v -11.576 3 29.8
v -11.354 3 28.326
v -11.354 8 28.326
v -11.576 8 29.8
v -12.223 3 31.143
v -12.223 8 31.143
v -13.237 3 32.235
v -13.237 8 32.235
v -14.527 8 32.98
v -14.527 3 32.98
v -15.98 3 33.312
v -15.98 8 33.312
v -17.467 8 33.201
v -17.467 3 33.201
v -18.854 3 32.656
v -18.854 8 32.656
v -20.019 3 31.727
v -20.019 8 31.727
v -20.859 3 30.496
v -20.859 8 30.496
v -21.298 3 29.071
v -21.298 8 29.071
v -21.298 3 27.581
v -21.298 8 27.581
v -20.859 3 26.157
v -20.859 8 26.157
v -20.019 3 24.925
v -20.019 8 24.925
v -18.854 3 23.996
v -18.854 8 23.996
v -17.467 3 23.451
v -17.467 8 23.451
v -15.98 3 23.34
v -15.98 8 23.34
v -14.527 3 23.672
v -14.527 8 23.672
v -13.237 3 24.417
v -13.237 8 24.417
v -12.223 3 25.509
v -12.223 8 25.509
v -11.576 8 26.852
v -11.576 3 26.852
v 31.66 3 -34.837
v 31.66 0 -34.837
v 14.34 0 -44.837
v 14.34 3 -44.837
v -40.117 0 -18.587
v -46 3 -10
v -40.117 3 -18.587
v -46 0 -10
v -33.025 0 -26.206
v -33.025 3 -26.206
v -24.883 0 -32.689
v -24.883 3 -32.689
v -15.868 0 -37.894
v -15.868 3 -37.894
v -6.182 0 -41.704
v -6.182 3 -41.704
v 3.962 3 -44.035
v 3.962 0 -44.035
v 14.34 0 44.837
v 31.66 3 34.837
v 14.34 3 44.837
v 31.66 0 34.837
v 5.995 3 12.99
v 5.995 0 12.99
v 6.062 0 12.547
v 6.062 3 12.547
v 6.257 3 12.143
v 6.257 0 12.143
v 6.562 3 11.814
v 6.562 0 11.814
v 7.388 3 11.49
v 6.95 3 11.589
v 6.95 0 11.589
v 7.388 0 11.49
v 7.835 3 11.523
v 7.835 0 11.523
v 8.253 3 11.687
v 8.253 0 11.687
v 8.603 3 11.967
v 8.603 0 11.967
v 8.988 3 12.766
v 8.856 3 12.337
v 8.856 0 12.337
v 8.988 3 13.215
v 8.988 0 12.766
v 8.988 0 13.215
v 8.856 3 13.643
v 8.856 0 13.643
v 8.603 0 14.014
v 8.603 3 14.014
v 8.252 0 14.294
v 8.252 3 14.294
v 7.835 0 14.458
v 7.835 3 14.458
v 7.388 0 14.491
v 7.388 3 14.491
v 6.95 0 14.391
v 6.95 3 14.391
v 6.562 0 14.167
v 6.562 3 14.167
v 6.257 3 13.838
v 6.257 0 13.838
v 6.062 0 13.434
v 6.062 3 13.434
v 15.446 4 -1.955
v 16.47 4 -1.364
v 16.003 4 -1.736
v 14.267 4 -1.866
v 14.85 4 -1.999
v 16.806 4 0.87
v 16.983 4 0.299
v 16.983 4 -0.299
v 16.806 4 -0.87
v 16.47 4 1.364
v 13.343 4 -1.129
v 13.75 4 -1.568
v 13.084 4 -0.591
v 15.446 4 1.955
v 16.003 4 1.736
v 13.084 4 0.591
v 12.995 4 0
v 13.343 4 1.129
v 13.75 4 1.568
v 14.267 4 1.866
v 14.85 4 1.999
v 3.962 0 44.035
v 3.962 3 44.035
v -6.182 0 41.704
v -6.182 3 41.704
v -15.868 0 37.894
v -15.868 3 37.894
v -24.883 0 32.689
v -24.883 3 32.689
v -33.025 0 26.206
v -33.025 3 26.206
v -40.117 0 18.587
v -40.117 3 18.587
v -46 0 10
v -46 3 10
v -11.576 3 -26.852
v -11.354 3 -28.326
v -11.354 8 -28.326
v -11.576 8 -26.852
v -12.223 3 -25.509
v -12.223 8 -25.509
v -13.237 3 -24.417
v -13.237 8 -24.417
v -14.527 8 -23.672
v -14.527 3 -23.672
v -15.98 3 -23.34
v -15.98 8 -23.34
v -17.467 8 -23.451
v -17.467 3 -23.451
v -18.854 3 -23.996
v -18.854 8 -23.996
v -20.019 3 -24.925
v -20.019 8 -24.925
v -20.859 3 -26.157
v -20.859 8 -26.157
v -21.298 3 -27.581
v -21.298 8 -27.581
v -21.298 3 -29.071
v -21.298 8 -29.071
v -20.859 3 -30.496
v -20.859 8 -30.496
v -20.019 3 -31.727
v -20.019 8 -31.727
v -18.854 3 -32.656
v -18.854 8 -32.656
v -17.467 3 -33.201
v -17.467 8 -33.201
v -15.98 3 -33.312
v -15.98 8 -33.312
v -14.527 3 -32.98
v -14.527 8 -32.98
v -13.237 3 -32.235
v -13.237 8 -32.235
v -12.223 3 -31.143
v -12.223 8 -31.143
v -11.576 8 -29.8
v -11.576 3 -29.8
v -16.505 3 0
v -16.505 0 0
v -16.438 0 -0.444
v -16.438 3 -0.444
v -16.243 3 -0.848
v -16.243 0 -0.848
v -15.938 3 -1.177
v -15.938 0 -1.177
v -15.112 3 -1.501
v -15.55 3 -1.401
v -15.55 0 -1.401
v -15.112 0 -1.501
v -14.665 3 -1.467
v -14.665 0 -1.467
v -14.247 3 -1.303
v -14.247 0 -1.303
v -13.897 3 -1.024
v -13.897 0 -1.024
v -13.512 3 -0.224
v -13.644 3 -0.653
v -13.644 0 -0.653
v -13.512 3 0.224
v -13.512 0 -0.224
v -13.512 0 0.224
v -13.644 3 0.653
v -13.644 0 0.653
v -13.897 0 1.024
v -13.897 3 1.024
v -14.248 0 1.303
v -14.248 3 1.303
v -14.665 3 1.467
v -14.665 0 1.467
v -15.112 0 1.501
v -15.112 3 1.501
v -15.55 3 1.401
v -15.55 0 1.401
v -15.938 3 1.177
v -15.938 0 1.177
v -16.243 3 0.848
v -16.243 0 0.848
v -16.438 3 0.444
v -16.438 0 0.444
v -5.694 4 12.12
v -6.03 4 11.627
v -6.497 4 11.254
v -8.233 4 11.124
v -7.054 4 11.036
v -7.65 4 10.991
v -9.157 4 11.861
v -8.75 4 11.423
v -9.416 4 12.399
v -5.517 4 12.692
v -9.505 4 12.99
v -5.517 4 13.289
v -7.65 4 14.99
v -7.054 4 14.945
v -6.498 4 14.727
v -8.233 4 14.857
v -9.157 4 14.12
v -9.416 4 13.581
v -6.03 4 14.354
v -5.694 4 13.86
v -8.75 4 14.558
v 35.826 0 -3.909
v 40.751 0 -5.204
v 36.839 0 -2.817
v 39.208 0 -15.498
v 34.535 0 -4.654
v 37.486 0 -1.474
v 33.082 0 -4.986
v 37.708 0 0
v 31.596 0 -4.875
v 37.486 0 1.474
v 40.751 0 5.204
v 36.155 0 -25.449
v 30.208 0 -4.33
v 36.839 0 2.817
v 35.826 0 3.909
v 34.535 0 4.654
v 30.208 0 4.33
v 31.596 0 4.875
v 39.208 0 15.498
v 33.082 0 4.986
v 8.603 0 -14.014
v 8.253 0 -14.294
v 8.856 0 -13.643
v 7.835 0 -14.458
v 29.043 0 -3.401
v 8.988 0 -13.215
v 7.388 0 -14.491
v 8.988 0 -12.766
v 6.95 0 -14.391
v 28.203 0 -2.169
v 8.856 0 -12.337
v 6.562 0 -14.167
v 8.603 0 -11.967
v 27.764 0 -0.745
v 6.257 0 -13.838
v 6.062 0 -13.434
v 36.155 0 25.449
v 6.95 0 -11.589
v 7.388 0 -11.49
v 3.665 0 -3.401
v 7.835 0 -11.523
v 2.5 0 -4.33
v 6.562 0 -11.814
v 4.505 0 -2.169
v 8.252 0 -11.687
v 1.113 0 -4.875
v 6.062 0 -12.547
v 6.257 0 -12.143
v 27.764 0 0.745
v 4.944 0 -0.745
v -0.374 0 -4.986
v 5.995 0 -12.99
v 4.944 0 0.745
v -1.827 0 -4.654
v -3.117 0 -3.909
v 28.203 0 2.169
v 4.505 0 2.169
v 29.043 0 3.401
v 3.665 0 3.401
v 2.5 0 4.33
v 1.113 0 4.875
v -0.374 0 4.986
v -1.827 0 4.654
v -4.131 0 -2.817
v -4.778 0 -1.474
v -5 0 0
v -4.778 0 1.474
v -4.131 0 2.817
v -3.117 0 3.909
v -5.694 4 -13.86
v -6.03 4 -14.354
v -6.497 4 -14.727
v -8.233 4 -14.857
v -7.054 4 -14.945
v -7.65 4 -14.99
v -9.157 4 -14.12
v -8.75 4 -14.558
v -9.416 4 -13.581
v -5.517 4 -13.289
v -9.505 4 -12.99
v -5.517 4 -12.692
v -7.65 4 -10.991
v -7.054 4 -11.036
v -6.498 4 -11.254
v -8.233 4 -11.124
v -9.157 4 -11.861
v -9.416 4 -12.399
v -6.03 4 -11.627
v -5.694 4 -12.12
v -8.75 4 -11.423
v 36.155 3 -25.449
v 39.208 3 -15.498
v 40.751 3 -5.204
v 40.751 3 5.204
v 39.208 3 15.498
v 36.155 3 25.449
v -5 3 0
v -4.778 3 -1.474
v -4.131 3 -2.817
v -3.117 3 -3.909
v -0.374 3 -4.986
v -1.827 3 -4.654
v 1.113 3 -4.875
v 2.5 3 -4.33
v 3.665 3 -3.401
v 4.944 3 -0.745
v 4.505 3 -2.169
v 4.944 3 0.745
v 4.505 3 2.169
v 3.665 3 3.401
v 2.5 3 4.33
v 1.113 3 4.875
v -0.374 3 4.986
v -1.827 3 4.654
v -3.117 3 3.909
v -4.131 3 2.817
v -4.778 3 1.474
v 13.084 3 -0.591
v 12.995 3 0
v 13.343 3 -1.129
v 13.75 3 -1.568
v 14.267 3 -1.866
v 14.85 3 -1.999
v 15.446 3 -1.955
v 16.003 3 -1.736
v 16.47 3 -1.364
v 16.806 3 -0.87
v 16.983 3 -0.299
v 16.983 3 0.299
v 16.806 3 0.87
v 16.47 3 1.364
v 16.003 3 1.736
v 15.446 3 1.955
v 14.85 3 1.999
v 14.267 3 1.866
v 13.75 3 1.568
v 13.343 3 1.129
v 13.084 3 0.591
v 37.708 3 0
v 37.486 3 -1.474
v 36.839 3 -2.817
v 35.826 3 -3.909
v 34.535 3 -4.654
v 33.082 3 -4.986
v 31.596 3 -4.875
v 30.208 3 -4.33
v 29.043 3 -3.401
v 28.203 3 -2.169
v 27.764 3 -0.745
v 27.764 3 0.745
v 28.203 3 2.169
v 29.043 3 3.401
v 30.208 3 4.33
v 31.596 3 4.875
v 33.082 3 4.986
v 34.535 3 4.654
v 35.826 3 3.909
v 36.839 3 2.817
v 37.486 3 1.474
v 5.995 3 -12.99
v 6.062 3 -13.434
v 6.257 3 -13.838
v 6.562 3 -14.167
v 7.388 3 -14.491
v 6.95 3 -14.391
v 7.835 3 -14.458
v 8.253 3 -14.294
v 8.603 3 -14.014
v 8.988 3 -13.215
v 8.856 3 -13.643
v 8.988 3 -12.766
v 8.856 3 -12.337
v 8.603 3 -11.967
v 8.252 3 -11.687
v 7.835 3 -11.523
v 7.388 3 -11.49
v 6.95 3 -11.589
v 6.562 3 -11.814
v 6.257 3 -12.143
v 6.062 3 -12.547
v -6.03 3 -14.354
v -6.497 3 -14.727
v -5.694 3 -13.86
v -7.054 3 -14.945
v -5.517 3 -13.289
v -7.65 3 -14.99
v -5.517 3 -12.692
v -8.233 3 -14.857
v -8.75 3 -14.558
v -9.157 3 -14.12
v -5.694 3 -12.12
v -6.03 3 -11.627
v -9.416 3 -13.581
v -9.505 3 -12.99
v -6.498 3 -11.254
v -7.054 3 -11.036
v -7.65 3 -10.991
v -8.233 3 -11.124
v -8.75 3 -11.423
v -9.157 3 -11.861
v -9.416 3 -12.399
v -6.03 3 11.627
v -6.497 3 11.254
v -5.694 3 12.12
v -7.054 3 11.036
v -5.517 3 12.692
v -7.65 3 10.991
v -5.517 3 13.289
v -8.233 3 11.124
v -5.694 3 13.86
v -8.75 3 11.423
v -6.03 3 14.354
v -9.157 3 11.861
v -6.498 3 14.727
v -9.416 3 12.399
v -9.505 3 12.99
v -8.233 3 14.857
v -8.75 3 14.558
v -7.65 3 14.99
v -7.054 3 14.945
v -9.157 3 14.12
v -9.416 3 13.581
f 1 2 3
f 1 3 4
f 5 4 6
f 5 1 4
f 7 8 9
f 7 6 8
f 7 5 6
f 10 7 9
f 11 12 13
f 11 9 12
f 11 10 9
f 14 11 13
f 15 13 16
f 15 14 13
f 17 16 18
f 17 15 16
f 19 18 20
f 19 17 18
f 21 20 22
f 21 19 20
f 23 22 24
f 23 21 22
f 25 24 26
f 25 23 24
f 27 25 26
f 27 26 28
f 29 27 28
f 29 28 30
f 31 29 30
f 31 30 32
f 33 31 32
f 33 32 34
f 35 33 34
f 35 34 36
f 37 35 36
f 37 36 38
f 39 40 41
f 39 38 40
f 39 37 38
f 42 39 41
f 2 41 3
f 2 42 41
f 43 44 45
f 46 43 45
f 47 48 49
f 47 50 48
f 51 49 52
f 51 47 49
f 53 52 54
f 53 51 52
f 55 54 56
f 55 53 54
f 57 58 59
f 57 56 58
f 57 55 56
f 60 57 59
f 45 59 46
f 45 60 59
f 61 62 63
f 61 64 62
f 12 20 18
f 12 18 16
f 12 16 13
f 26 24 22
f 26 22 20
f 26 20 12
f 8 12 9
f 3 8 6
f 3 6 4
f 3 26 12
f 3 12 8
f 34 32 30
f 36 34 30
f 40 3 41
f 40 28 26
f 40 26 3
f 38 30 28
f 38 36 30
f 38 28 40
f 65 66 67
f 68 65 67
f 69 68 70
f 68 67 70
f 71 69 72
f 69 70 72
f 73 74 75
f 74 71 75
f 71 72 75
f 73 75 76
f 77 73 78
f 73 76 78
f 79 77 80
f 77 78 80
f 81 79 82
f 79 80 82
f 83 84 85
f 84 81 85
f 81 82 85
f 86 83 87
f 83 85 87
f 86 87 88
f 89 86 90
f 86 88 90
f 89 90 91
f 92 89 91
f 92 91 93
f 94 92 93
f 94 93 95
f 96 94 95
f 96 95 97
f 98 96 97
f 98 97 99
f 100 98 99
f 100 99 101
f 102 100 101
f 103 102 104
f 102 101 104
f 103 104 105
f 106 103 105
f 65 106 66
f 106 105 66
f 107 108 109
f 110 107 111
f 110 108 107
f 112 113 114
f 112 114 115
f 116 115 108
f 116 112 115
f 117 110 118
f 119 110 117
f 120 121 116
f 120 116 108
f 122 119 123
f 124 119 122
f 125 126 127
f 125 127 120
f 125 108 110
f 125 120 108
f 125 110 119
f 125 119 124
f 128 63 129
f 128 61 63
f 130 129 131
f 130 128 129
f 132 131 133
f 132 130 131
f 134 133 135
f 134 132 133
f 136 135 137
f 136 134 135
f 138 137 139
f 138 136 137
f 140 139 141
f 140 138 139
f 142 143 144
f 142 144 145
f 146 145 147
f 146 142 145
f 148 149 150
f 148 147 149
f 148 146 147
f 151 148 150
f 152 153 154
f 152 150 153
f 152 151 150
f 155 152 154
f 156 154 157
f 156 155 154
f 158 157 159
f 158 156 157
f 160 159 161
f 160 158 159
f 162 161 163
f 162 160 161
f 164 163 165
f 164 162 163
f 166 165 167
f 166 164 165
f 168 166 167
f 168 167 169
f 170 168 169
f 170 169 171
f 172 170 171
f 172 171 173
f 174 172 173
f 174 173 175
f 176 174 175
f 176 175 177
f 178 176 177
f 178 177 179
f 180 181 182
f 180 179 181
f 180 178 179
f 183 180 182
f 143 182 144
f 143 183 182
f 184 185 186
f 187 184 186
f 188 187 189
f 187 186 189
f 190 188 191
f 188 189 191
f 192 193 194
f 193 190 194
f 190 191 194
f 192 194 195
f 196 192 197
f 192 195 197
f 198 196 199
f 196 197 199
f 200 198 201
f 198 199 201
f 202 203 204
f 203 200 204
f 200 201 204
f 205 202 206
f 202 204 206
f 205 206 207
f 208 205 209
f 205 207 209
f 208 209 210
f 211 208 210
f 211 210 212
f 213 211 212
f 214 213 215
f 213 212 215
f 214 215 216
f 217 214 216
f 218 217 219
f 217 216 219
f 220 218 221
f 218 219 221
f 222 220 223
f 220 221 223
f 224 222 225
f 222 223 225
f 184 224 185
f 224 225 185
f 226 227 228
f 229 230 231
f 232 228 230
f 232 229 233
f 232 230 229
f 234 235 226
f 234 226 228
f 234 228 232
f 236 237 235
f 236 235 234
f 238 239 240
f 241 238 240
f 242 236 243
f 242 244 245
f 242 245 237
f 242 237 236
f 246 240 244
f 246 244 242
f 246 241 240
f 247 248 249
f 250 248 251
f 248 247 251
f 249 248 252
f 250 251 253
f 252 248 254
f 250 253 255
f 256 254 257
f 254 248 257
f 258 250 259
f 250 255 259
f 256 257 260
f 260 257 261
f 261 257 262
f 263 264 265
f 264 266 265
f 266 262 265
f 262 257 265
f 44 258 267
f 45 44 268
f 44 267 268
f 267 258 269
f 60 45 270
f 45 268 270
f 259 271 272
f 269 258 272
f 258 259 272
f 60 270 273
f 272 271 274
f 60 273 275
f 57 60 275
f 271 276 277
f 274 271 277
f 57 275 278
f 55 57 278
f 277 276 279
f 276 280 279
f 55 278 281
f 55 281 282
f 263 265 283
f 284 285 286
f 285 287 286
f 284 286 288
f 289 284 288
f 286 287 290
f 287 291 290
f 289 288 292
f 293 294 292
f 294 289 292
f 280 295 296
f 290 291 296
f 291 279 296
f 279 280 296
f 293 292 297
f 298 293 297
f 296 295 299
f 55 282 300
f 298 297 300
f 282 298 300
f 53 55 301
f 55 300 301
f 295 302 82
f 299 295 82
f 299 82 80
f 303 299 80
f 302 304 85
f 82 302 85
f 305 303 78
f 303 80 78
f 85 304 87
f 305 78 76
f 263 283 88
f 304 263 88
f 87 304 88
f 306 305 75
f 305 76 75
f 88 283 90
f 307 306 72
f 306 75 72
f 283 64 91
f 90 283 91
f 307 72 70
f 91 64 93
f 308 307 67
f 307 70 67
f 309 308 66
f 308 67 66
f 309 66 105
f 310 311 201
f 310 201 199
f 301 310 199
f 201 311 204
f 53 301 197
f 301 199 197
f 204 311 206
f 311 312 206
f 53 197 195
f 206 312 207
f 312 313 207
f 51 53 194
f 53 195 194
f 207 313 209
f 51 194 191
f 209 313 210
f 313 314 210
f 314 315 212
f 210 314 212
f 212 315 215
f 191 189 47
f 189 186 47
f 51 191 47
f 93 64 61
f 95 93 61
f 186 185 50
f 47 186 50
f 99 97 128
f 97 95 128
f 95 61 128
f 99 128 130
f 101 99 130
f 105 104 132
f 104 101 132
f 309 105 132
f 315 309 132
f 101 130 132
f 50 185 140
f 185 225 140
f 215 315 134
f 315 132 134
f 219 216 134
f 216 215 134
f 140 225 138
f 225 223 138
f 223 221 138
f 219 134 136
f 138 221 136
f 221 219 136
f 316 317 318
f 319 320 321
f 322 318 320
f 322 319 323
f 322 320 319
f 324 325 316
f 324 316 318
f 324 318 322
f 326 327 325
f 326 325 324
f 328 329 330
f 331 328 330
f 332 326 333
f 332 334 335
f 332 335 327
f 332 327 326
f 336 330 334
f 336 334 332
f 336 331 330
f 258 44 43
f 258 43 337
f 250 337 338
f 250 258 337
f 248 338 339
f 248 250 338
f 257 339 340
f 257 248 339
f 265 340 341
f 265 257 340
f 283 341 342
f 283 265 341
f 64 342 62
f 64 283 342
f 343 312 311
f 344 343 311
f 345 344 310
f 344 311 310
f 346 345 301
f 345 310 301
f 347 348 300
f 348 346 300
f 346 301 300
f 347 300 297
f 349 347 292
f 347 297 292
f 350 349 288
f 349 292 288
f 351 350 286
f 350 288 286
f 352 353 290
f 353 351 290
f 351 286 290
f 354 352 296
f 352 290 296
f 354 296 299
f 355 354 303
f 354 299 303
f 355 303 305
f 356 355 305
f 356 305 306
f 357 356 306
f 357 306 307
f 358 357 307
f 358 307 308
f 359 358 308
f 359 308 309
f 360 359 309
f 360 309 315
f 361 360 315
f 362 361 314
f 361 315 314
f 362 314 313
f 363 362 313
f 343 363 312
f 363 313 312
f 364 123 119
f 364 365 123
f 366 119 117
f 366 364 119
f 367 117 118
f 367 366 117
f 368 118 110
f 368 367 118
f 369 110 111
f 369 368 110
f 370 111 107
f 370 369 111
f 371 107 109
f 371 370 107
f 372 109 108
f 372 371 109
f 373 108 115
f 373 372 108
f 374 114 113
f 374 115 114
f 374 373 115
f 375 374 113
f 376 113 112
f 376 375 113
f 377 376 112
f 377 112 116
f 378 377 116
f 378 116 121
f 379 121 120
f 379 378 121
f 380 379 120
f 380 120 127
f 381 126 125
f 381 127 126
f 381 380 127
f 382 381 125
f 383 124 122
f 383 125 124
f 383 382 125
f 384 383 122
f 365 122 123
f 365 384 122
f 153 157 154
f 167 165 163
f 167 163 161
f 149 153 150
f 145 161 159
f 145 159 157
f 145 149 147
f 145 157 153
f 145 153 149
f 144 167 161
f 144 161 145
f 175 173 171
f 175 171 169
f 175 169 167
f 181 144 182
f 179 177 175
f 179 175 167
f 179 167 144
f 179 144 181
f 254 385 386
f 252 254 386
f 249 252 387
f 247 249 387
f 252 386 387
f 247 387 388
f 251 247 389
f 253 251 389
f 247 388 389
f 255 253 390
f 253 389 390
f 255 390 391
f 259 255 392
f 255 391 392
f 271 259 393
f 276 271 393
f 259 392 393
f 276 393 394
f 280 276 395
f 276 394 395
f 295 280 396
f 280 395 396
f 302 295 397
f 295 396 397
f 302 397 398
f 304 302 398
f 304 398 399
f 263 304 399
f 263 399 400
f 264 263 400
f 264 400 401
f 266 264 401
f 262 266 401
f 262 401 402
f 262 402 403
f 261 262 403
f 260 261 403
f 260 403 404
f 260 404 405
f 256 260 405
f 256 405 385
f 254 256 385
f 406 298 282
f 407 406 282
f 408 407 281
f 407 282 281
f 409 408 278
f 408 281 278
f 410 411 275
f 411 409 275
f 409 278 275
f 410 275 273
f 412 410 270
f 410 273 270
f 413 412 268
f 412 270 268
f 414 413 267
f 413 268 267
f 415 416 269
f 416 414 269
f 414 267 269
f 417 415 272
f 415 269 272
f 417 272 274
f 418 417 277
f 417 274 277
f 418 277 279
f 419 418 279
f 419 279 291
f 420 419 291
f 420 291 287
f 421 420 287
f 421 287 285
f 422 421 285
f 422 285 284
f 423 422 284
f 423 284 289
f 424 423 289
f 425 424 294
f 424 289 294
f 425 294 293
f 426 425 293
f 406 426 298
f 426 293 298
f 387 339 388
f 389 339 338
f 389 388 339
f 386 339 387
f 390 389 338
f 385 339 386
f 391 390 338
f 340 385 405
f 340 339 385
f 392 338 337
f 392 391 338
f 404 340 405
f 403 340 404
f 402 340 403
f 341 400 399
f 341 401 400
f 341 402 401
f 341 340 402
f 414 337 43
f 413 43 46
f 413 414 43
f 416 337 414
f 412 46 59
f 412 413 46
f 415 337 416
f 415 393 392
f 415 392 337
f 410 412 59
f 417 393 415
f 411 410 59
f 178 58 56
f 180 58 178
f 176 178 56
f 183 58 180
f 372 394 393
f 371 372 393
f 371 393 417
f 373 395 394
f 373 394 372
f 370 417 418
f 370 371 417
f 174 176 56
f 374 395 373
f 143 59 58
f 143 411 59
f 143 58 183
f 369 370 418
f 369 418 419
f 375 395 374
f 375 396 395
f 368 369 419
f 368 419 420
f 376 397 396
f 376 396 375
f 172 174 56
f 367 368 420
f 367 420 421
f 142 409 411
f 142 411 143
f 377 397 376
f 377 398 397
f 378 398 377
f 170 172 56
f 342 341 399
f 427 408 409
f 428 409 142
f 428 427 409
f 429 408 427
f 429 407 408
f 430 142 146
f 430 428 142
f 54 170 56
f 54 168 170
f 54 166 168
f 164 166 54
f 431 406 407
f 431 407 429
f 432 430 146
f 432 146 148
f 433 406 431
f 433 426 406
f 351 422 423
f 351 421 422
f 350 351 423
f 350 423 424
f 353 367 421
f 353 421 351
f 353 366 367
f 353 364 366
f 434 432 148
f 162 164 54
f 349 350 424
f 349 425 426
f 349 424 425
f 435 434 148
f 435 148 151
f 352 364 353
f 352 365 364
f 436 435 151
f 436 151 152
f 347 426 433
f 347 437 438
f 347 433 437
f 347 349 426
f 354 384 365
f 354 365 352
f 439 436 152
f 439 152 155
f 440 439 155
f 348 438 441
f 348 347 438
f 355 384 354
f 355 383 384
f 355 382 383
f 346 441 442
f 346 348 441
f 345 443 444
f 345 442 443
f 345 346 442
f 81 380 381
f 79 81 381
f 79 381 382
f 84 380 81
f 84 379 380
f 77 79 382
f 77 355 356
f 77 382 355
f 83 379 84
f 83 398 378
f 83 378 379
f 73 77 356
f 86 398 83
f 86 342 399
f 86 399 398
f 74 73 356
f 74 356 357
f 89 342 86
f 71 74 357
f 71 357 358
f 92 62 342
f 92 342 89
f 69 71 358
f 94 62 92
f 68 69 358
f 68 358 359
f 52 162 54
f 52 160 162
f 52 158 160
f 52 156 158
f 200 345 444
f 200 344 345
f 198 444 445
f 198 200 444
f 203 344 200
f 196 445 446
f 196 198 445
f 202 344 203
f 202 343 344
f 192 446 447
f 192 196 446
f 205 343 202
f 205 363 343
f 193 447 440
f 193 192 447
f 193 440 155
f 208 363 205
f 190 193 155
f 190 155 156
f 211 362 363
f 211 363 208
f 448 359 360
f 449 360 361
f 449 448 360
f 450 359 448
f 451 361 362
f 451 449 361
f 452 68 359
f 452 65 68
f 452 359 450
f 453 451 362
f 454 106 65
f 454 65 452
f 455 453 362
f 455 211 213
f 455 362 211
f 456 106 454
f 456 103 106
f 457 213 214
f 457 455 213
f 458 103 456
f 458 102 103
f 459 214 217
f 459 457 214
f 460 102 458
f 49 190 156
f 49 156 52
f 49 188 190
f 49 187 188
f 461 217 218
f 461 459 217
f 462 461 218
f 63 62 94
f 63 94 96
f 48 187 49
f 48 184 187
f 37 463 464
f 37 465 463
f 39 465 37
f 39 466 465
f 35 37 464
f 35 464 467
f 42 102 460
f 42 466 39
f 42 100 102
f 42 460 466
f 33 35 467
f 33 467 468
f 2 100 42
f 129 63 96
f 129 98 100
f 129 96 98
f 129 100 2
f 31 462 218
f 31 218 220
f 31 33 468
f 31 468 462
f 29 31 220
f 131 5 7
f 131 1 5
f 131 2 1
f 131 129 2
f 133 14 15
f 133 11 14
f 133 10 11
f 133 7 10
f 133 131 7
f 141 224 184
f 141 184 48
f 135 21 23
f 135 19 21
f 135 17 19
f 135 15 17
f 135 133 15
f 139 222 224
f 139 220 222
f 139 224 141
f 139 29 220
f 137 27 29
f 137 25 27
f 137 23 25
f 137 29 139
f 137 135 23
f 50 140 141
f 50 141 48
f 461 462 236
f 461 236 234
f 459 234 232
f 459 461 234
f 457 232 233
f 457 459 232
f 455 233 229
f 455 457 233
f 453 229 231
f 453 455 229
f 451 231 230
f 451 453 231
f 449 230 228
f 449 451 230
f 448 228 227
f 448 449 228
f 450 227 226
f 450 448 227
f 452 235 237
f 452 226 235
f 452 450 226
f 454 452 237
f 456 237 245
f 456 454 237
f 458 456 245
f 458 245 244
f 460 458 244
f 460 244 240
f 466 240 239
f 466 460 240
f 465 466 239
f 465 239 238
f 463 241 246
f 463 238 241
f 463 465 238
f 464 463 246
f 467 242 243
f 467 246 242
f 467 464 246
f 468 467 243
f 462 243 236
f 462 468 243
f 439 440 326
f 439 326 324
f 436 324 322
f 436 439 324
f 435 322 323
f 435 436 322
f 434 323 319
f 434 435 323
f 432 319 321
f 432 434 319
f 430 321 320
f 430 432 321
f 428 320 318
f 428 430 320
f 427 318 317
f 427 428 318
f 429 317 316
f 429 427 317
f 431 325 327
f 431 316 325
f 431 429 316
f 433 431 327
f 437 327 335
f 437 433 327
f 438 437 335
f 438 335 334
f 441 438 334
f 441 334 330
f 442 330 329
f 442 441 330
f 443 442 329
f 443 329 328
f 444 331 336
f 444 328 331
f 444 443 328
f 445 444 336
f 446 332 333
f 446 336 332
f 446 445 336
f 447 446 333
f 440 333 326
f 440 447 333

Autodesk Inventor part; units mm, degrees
ref_plane "YZ Plane" through (0, 0, 0) normal (1, 0, 0) x (0, 1, 0)
ref_plane "XZ Plane" through (0, 0, 0) normal (0, 1, 0) x (-1, 0, 0)
ref_plane "XY Plane" through (0, 0, 0) normal (0, 0, 1) x (1, 0, 0)
sketch "Sketch1" plane through (0, 0, 0) normal (0, 1, 0) x (-1, 0, 0)
  circle A0 centre (0, 0) radius 25
  circle A1 centre (0, 0) radius 5
  circle A2 centre (15, 0) radius 1.505
  line L0 (46, 0) -> (46, -10)
  line L1 (46, -10) -> (40, -10)
  line L2 (34, 0) -> (34, -10)
  line L3 (34, -10) -> (40, -10)
  line L4 (34, 0) -> (46, 0)
  line L5 (46, 0) -> (46, 10)
  line L6 (46, 10) -> (34, 10)
  line L7 (34, 10) -> (34, 0)
  line L8 (-23, 39.8372) -> (-14.3397, 44.8372)
  line L9 (-14.3397, 44.8372) -> (-11.3397, 39.641)
  line L10 (-17, 29.4449) -> (-8.3397, 34.4449)
  line L11 (-8.3397, 34.4449) -> (-11.3397, 39.641)
  line L12 (-17, 29.4449) -> (-23, 39.8372)
  line L13 (-23, 39.8372) -> (-31.6603, 34.8372)
  line L14 (-31.6603, 34.8372) -> (-25.6603, 24.4449)
  line L15 (-25.6603, 24.4449) -> (-17, 29.4449)
  line L16 (-23, -39.8372) -> (-31.6603, -34.8372)
  line L17 (-31.6603, -34.8372) -> (-28.6603, -29.641)
  line L18 (-17, -29.4449) -> (-25.6603, -24.4449)
  line L19 (-25.6603, -24.4449) -> (-28.6603, -29.641)
  line L20 (-17, -29.4449) -> (-23, -39.8372)
  line L21 (-23, -39.8372) -> (-14.3397, -44.8372)
  line L22 (-14.3397, -44.8372) -> (-8.3397, -34.4449)
  line L23 (-8.3397, -34.4449) -> (-17, -29.4449)
  circle A3 centre (-7.5, 12.9904) radius 1.505
  circle A4 centre (-7.5, -12.9904) radius 1.505
  circle A5 centre (-15, 0) radius 2.005
  circle A6 centre (7.5, -12.9904) radius 2.005
  circle A7 centre (7.5, 12.9904) radius 2.005
  arc A8 (46, 10) -> (-14.3397, 44.8372) centre (-14.5276, -25.1626) ccw
  arc A9 (-14.3397, -44.8372) -> (46, -10) centre (-14.5276, 25.1626) ccw
  arc A10 (-31.6603, 34.8372) -> (-31.6603, -34.8372) centre (29.0552, 0) ccw
  point P0 (40, 0)
  dimension "d22" = 360
  dimension "d26" = 360
  dimension "d32" = 360
  dimension "d34" = 70
  dimension "d35" = 70
  dimension "d36" = 70
  dimension "d90" = 10
extrude "Extrusion1" add sketch "Sketch1" along normal blind 3 contours L0 L1 L3 L2 L4 | L4 L7 L6 L5 | A9 L22 L23 L18 L19 L17 A10 L14 L15 L10 L11 L9 A8 L6 L7 L2 L3 L1 | L21 L20 L23 L22 | L9 L11 L10 L12 L8 | L16 L17 L19 L18 L20 | L12 L15 L14 L13
sketch "Sketch2" plane through (0, 3, 0) normal (0, 1, 0) x (1, 0, 0)
  circle A0 centre (32.7082, 0) radius 5
  circle A1 centre (-16.3541, 28.3261) radius 5
  circle A2 centre (-16.3541, -28.3261) radius 5
  point P0 (0, 0)
  dimension "d43" = 10
  dimension "d46" = 360
extrude "Extrusion4" add sketch "Sketch2" along normal blind 5 contours A1 | A2
extrude "Extrusion7" add sketch "Sketch1" along normal blind 3 contours A0
sketch "Sketch8" plane through (0, 3, 0) normal (0, 1, 0) x (1, 0, 0)
  point P0 (0, 0)
extrude "Extrusion9" add sketch "Sketch1" along normal blind 4 contours A5 | A6 | A7
extrude "Extrusion10" cut sketch "Sketch2" against normal blind 5 contours A0
equation "\"BendRadius\" = Thickness"
equation "\"BendReliefWidth\" = Thickness"
equation "\"BendReliefDepth\" = 0.5 * Thickness"
equation "\"CornerReliefSize\" = 4 * Thickness"
equation "\"MinimumRemnant\" = 2 * Thickness"
equation "\"TransitionRadius\" = BendRadius"
equation "\"JacobiRadiusSize\" = BendRadius"
equation "\"GapSize\" = Thickness"
equation "\"Thickness\" = 0.5"
properties part number "Tool_1"
